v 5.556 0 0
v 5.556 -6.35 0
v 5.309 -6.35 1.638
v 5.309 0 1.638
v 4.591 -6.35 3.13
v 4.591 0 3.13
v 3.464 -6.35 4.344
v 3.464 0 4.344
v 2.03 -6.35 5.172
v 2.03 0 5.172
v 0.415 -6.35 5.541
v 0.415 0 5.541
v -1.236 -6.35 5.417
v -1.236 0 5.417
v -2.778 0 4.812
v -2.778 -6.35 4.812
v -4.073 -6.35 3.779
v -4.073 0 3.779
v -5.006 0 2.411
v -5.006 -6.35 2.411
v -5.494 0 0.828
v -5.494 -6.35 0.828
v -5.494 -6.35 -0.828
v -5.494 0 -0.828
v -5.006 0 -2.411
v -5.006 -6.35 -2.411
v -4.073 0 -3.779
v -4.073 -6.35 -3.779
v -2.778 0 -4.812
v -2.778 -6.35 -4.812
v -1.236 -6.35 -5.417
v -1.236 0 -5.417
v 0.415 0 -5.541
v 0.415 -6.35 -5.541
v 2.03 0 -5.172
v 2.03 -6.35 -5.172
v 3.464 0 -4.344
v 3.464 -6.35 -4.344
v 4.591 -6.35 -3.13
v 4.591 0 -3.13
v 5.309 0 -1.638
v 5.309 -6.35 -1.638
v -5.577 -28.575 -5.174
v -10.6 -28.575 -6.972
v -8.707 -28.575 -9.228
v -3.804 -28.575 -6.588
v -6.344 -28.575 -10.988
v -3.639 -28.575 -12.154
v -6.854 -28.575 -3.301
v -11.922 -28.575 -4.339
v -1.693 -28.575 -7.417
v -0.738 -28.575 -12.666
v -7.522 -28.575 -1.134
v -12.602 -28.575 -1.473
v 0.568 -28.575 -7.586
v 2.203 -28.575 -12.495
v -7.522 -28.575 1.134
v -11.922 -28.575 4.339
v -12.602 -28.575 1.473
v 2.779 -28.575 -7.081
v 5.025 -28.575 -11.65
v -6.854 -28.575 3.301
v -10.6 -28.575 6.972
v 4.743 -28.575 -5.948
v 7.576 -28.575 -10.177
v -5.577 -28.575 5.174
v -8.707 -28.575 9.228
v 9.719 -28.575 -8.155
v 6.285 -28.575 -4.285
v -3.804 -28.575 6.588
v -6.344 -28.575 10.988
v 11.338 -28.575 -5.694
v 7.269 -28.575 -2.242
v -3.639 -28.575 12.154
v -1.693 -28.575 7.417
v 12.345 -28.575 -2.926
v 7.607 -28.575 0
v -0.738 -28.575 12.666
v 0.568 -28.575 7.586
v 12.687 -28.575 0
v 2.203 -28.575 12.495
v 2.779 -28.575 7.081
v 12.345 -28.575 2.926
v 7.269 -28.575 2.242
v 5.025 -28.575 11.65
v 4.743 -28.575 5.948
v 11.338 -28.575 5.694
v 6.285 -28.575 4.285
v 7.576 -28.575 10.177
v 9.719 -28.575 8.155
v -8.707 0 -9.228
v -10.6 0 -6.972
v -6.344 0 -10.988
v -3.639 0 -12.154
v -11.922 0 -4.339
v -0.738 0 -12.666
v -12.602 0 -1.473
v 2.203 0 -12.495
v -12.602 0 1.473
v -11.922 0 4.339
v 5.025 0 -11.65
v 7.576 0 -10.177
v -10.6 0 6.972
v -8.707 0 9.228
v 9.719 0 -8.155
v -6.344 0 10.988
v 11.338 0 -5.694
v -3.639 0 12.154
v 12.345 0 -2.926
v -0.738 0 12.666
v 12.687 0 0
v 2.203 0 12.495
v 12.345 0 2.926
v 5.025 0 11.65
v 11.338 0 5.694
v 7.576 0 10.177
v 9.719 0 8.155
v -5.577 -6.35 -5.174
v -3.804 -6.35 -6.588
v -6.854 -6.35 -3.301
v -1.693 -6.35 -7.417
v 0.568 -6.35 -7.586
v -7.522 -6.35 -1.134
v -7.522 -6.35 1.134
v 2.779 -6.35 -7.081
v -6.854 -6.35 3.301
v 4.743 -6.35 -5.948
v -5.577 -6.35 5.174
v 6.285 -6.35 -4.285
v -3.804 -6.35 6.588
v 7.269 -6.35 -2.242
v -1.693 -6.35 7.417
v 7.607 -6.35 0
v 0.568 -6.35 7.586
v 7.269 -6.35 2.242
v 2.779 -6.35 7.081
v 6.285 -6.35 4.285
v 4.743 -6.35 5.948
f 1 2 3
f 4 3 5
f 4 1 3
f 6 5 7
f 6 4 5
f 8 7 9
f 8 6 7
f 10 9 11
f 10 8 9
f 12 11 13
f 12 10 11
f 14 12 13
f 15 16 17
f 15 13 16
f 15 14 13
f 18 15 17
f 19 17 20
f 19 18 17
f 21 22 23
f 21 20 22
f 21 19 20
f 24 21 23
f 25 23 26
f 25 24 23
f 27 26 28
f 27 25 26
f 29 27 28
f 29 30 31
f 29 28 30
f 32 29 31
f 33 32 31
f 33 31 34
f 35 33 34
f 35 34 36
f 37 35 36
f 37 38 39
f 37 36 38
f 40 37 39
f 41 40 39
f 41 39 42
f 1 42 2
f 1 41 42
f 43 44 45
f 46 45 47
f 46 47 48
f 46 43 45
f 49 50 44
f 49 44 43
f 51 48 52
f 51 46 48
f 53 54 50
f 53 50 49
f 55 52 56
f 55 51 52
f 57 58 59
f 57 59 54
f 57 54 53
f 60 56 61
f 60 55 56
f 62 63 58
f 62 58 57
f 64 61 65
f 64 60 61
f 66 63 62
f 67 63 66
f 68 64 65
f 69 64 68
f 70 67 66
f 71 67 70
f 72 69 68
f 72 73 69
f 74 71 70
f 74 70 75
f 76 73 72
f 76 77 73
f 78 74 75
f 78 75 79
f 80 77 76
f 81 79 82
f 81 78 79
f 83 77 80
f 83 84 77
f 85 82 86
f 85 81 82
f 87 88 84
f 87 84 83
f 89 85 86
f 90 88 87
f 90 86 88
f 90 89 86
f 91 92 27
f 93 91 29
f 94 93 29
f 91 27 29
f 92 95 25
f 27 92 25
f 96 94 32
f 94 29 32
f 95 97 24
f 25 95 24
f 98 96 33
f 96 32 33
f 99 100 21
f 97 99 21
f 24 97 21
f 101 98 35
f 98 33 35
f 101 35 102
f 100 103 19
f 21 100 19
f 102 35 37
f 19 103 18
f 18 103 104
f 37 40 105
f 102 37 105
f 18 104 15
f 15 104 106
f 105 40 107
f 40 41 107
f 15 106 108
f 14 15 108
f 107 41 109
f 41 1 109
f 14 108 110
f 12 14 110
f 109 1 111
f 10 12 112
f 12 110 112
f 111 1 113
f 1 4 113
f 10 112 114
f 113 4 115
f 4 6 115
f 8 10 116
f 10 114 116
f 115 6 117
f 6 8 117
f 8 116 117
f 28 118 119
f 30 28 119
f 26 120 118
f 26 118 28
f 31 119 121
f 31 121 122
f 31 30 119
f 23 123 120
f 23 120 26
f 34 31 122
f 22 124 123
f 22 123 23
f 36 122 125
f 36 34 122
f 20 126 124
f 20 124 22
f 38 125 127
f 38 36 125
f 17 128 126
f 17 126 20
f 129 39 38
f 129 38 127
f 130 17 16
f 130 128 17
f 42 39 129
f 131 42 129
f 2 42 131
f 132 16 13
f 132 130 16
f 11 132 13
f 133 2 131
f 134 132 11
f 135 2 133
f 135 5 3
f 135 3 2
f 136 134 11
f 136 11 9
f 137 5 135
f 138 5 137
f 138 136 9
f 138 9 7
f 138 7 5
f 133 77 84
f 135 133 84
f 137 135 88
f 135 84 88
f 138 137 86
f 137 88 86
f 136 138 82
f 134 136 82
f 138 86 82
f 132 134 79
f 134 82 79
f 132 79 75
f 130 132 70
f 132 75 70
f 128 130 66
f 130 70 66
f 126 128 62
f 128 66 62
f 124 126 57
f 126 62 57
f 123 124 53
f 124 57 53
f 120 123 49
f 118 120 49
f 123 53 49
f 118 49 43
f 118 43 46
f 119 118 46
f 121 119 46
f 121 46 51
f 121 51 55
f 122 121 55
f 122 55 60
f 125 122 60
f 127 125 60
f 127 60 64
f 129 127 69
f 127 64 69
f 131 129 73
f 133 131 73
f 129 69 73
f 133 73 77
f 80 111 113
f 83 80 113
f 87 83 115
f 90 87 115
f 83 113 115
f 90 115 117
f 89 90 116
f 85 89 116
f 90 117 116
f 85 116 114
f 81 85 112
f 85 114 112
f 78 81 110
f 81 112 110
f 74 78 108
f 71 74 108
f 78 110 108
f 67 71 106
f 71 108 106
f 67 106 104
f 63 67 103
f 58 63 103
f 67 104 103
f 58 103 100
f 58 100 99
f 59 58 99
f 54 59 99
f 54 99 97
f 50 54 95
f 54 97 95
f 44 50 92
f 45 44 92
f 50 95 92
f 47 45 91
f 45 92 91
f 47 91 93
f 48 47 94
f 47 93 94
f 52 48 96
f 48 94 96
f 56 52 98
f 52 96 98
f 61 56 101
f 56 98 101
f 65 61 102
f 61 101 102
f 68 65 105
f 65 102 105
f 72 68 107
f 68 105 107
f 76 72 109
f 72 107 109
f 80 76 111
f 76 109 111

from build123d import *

# Parameters (mm, degrees)
F0_R     = 12.6873
F0_R_2   = 7.6073
F0_R_3   = 5.55625
F1_DEPTH = 28.575
F2_R     = 7.6073
F3_DEPTH = 22.225
F4_R     = 5.55625
F5_DEPTH = 6.351


with BuildPart() as f1:
    # F0 (on Front) → F1 (new body)
    with BuildSketch(Plane.XZ):
        Circle(F0_R)
        Circle(F0_R_2, mode=Mode.SUBTRACT)
        Circle(F0_R_3)
        Circle(F0_R_2)
        Circle(F0_R_3, mode=Mode.SUBTRACT)
    extrude(amount=F1_DEPTH)

    # F2 (on face) → F3 (cut)
    with BuildSketch(Plane.XZ.offset(28.575)):
        Circle(F2_R)
    extrude(amount=-F3_DEPTH, mode=Mode.SUBTRACT)

    # F4 (on face) → F5 (cut, through all)
    with BuildSketch(Plane.XZ.offset(6.35)):
        Circle(F4_R)
    extrude(amount=-F5_DEPTH, mode=Mode.SUBTRACT)


solid = f1.part
